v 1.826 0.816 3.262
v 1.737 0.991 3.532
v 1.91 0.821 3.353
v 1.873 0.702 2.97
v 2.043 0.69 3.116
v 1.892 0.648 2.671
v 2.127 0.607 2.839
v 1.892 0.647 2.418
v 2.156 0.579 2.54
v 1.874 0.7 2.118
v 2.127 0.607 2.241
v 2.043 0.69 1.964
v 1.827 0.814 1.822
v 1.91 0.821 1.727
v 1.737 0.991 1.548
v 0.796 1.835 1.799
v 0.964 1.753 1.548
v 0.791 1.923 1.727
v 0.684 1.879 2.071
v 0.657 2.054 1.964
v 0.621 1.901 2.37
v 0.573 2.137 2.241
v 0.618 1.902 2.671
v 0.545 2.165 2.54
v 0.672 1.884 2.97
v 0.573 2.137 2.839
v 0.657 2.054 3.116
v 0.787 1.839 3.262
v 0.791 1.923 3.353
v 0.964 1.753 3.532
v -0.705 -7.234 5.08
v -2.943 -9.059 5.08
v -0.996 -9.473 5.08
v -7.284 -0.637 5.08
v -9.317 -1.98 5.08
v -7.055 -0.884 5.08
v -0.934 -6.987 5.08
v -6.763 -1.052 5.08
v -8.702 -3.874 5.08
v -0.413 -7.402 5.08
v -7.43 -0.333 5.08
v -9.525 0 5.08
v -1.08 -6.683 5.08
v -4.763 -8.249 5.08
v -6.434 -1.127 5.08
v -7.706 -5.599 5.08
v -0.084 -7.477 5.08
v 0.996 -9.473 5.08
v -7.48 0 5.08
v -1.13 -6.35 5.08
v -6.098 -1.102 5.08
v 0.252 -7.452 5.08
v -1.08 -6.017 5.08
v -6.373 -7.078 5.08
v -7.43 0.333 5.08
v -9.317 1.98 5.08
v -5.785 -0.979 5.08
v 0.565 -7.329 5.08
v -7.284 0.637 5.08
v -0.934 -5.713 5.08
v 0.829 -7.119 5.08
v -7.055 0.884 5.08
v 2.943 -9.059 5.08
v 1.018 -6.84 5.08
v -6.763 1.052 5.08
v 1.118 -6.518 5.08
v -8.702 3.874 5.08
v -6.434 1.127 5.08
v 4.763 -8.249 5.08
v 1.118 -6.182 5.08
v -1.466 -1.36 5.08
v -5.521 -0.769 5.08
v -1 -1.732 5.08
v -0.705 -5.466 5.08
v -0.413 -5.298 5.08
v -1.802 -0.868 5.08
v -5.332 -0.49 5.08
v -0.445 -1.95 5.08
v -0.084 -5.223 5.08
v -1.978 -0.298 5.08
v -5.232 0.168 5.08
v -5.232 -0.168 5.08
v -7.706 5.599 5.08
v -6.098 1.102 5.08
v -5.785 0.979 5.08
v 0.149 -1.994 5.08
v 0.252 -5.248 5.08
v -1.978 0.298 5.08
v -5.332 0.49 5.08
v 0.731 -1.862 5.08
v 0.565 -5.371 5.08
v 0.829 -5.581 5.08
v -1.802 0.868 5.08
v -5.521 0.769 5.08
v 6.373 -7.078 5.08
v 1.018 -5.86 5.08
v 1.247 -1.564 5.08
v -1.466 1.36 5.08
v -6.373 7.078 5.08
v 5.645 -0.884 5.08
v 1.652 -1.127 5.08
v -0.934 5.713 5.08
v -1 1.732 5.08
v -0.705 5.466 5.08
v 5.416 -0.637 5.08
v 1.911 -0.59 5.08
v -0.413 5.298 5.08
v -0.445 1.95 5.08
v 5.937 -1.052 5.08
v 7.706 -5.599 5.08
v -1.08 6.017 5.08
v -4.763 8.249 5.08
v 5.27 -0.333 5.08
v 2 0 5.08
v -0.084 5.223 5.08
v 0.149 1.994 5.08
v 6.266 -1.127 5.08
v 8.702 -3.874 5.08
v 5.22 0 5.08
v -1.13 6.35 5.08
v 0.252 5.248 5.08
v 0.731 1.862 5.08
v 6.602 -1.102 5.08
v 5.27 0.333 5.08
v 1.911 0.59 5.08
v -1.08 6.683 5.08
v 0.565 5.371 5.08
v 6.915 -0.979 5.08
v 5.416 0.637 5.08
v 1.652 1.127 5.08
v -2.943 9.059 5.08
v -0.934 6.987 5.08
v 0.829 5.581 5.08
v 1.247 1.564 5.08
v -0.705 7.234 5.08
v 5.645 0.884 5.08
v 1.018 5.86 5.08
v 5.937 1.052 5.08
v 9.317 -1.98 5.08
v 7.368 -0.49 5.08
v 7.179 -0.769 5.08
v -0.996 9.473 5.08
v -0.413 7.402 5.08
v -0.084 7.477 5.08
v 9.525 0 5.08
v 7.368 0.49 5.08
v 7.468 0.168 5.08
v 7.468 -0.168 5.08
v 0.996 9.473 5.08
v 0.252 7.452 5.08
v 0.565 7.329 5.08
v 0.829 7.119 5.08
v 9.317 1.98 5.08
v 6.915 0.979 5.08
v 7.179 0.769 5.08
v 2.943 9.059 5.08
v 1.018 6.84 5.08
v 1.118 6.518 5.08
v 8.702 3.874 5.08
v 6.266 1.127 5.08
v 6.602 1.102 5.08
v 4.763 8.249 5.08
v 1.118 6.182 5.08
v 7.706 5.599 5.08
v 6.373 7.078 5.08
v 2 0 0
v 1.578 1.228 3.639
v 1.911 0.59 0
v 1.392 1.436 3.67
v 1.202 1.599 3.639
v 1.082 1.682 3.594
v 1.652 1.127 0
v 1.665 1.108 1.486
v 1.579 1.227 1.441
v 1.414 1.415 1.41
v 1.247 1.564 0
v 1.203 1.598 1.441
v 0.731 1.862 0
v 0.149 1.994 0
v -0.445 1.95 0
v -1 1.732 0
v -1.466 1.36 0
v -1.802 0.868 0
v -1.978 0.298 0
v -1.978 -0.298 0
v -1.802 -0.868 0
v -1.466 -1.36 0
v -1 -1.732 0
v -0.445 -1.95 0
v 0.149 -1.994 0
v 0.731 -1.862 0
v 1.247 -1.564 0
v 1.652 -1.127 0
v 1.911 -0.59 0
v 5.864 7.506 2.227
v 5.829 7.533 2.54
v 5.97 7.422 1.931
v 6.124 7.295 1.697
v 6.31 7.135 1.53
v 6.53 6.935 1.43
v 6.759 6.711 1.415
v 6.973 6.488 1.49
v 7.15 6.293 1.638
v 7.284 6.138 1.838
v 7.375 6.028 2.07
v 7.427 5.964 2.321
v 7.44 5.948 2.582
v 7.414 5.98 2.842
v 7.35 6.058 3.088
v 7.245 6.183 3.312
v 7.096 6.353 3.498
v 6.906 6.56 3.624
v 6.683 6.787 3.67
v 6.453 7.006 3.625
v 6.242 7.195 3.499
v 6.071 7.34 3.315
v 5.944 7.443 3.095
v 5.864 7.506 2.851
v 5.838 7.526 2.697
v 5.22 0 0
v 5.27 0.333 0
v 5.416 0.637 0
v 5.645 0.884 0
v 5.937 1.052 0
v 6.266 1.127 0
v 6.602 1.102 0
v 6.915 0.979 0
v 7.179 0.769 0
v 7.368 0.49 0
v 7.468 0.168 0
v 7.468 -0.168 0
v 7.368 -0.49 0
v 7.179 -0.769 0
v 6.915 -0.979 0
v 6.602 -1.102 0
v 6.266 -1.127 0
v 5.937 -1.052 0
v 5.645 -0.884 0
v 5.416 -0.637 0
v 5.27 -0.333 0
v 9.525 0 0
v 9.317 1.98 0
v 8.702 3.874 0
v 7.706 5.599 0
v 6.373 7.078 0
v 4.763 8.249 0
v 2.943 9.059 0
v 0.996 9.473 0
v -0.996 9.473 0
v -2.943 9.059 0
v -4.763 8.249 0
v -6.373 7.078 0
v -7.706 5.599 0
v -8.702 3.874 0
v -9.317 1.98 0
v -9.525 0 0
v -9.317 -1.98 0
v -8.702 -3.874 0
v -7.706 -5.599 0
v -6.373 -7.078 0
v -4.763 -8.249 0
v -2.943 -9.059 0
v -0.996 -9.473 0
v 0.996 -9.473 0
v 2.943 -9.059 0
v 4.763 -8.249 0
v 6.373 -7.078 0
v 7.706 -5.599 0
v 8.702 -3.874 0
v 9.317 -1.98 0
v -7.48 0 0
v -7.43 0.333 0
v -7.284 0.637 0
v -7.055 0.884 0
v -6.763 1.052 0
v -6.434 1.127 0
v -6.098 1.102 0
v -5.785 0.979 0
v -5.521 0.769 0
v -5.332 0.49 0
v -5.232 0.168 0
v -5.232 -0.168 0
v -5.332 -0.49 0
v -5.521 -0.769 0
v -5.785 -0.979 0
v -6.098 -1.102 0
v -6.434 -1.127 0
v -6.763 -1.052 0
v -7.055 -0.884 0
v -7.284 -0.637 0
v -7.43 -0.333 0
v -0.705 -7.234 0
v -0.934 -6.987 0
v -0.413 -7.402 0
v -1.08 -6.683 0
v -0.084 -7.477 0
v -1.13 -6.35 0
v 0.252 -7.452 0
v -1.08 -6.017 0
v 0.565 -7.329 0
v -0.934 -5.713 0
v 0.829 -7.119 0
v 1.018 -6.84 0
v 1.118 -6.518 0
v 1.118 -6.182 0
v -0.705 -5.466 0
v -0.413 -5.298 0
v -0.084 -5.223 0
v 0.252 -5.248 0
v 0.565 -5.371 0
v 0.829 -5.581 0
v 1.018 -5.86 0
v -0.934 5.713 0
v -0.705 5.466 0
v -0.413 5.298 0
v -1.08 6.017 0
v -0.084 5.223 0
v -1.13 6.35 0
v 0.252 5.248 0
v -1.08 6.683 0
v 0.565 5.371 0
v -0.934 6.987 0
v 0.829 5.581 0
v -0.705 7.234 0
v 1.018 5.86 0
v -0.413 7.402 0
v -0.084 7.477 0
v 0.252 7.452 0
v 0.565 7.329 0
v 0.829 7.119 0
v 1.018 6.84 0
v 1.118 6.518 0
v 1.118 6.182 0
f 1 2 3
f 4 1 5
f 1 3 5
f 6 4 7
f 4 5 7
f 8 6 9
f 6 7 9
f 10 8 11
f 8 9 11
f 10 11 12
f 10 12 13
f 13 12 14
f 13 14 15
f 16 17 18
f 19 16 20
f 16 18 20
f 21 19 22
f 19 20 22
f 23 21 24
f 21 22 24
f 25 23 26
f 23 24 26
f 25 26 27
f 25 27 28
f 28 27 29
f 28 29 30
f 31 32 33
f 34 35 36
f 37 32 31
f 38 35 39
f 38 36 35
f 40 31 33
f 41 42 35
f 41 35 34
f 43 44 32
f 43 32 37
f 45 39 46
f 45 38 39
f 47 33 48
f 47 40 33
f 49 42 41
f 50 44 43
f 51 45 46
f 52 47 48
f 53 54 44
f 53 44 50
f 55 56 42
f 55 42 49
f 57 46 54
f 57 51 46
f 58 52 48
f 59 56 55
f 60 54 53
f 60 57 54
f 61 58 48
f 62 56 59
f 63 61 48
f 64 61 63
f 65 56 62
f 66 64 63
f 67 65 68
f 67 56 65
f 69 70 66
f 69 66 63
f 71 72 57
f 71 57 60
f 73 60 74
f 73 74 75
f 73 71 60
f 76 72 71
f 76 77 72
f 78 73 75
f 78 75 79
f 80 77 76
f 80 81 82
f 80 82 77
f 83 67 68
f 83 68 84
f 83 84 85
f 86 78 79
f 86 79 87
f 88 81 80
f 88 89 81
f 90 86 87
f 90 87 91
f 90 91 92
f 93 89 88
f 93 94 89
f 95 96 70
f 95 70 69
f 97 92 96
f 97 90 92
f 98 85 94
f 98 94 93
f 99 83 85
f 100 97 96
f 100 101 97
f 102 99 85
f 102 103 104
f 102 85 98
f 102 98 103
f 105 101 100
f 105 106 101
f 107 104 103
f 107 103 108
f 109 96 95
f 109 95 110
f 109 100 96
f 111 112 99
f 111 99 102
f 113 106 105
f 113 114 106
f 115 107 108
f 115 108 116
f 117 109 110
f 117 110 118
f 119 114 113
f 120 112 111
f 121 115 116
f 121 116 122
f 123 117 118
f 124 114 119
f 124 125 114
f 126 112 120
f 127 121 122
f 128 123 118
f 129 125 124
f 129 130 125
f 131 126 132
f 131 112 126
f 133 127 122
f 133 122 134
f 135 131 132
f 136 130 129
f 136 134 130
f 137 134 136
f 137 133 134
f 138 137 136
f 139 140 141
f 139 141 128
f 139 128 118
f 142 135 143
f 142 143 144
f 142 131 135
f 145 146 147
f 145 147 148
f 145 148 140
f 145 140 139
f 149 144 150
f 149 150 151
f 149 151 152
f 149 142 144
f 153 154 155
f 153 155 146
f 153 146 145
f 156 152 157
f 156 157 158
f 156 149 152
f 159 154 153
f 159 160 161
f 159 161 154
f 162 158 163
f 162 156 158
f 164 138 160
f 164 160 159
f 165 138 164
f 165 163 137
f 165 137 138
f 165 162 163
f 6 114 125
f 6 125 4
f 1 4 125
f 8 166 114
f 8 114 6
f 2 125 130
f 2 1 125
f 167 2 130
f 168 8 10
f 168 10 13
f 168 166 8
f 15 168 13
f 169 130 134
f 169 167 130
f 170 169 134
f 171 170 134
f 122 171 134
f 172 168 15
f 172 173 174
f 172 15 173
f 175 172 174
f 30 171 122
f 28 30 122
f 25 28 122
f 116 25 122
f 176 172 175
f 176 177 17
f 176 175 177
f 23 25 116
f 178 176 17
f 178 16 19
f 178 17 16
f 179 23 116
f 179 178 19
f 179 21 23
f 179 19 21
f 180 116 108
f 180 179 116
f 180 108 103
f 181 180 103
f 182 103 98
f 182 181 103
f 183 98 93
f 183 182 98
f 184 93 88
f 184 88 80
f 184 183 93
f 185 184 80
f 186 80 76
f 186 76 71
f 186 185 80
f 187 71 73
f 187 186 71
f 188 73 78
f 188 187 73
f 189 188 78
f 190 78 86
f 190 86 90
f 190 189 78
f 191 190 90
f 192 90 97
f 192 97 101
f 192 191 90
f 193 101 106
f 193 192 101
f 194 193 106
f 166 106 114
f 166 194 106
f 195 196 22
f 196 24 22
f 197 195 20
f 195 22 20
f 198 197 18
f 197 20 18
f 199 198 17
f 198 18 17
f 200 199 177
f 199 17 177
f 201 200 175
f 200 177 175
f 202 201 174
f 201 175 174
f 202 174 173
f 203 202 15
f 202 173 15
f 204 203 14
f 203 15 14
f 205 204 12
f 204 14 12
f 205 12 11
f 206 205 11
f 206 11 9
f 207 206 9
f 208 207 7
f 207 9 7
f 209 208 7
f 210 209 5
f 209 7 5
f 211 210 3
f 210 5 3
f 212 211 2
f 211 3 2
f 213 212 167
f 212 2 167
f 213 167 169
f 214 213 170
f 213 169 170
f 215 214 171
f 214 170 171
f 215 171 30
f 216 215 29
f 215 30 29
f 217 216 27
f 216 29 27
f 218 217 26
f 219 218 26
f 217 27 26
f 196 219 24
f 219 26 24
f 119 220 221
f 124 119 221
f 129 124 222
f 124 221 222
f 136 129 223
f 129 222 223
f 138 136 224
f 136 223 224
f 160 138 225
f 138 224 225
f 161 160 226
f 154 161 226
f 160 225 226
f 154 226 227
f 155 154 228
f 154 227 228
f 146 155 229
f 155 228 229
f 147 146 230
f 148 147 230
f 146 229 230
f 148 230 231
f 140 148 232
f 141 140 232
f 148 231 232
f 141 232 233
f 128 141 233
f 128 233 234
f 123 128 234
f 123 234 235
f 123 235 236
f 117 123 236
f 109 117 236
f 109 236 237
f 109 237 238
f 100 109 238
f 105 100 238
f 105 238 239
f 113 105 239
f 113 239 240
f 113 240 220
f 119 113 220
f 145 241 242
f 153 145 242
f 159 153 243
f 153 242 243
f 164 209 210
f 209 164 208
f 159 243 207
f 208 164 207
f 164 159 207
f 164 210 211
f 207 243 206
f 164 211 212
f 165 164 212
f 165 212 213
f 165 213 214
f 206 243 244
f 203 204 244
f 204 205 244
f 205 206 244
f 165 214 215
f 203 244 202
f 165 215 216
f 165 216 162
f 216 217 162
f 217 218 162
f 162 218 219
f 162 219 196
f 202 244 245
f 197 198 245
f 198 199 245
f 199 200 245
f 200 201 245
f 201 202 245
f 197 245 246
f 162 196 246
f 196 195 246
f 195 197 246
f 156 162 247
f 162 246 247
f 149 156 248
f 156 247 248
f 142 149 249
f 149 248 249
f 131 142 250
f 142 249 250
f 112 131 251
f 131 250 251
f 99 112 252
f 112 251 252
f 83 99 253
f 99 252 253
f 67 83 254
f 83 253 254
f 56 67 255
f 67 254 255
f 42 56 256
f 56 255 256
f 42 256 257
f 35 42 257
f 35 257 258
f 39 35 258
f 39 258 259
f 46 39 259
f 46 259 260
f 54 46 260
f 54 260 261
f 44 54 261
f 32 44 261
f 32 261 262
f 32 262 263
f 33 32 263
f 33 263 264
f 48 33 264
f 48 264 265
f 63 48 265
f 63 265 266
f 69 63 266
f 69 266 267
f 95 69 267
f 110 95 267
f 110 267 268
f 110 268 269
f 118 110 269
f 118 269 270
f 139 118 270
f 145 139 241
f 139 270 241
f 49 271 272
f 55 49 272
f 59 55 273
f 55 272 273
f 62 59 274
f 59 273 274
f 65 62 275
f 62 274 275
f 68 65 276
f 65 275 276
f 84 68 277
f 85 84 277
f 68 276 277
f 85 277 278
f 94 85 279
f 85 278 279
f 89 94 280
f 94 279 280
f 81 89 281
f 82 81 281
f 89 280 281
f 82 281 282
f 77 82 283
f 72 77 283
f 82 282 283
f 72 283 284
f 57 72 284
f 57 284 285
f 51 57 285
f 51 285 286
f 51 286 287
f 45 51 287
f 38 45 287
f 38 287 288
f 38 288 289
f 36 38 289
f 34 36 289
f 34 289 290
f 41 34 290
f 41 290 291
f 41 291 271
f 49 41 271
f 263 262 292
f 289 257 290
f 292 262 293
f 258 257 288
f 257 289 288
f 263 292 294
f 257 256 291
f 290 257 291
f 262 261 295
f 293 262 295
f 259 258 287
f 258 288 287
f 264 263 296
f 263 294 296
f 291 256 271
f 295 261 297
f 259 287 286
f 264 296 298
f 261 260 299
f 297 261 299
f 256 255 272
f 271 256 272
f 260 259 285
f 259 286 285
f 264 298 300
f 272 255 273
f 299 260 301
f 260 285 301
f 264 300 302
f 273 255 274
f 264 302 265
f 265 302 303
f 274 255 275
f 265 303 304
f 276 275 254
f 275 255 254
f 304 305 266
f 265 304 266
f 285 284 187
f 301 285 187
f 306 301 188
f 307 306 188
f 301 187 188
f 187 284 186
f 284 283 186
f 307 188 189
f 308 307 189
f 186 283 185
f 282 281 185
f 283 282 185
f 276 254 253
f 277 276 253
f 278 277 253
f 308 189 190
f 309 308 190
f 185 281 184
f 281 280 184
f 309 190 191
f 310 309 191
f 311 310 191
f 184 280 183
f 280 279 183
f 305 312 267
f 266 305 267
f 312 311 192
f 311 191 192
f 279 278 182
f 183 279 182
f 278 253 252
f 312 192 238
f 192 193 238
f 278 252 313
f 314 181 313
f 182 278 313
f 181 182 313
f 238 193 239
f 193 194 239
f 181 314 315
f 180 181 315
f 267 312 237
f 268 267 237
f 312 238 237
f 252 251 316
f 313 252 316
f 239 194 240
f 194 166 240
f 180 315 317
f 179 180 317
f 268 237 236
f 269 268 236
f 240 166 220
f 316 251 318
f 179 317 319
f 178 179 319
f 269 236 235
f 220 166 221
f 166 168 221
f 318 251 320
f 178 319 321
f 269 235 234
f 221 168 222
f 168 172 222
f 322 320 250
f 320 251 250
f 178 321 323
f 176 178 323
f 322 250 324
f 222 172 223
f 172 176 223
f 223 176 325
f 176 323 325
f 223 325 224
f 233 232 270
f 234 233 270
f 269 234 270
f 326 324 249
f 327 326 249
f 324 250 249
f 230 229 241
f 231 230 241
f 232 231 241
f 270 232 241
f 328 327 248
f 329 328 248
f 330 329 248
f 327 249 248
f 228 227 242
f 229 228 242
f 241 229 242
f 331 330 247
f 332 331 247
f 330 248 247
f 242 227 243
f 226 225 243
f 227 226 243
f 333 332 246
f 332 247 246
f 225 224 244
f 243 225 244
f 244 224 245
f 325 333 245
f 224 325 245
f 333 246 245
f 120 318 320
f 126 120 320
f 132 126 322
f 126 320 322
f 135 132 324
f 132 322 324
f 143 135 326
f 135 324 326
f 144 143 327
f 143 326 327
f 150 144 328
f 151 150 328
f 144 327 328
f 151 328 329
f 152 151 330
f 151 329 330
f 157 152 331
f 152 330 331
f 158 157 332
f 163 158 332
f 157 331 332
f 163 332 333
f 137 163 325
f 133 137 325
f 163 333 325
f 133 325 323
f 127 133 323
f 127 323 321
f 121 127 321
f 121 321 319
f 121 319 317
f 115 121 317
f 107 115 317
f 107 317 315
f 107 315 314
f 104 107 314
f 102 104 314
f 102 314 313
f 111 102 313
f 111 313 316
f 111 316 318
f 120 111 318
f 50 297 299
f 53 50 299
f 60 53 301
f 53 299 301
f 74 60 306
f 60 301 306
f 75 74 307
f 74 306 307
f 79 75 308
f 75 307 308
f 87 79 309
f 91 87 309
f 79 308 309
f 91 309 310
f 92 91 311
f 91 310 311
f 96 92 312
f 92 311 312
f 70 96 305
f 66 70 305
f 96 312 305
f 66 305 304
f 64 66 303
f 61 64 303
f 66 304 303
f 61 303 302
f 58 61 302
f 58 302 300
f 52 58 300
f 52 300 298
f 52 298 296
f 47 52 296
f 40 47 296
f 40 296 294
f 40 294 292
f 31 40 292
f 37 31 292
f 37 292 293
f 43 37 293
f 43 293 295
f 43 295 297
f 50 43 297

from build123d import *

# Parameters (mm, degrees)
SKETCH1_R                 = 9.525
SKETCH1_R_2               = 2
BOSS_EXTRUDE1_DEPTH       = 5.08
F_4_40_TAPPED_HOLE3_D     = 2.2606
F_4_40_TAPPED_HOLE3_DEPTH = 7.6
F_4_40_TAPPED_HOLE3_TIP   = 0.679152758
F_4_40_TAPPED_HOLE2_D     = 2.2606
F_4_40_TAPPED_HOLE2_DEPTH = 7.6
F_4_40_TAPPED_HOLE2_TIP   = 0.679152758


with BuildPart() as part:
    # Sketch1 → Boss-Extrude1 (new body)
    with BuildSketch(Plane.XY):
        Circle(SKETCH1_R)
        Circle(SKETCH1_R_2, mode=Mode.SUBTRACT)
    extrude(amount=BOSS_EXTRUDE1_DEPTH)

    # #4-40 Tapped Hole3
    with Locations(Plane.XY.offset(5.08)):
        with Locations((-6.35, 0), (6.35, 0), (0, 6.35), (0, -6.35)):
            Hole(F_4_40_TAPPED_HOLE3_D / 2, depth=F_4_40_TAPPED_HOLE3_DEPTH)
            with Locations((0, 0, -(F_4_40_TAPPED_HOLE3_DEPTH + F_4_40_TAPPED_HOLE3_TIP / 2))):  # 118° drill point
                Cone(0, F_4_40_TAPPED_HOLE3_D / 2, F_4_40_TAPPED_HOLE3_TIP, mode=Mode.SUBTRACT)

    # #4-40 Tapped Hole2
    with Locations(Plane(origin=(6.681738172, 6.788225099, 2.54), x_dir=(0.712674551117, -0.701494821214, 0), z_dir=(0.701494821214, 0.712674551117, 0))):
        with Locations((0, 0)):
            Hole(F_4_40_TAPPED_HOLE2_D / 2, depth=F_4_40_TAPPED_HOLE2_DEPTH)
            with Locations((0, 0, -(F_4_40_TAPPED_HOLE2_DEPTH + F_4_40_TAPPED_HOLE2_TIP / 2))):  # 118° drill point
                Cone(0, F_4_40_TAPPED_HOLE2_D / 2, F_4_40_TAPPED_HOLE2_TIP, mode=Mode.SUBTRACT)


solid = part.part
